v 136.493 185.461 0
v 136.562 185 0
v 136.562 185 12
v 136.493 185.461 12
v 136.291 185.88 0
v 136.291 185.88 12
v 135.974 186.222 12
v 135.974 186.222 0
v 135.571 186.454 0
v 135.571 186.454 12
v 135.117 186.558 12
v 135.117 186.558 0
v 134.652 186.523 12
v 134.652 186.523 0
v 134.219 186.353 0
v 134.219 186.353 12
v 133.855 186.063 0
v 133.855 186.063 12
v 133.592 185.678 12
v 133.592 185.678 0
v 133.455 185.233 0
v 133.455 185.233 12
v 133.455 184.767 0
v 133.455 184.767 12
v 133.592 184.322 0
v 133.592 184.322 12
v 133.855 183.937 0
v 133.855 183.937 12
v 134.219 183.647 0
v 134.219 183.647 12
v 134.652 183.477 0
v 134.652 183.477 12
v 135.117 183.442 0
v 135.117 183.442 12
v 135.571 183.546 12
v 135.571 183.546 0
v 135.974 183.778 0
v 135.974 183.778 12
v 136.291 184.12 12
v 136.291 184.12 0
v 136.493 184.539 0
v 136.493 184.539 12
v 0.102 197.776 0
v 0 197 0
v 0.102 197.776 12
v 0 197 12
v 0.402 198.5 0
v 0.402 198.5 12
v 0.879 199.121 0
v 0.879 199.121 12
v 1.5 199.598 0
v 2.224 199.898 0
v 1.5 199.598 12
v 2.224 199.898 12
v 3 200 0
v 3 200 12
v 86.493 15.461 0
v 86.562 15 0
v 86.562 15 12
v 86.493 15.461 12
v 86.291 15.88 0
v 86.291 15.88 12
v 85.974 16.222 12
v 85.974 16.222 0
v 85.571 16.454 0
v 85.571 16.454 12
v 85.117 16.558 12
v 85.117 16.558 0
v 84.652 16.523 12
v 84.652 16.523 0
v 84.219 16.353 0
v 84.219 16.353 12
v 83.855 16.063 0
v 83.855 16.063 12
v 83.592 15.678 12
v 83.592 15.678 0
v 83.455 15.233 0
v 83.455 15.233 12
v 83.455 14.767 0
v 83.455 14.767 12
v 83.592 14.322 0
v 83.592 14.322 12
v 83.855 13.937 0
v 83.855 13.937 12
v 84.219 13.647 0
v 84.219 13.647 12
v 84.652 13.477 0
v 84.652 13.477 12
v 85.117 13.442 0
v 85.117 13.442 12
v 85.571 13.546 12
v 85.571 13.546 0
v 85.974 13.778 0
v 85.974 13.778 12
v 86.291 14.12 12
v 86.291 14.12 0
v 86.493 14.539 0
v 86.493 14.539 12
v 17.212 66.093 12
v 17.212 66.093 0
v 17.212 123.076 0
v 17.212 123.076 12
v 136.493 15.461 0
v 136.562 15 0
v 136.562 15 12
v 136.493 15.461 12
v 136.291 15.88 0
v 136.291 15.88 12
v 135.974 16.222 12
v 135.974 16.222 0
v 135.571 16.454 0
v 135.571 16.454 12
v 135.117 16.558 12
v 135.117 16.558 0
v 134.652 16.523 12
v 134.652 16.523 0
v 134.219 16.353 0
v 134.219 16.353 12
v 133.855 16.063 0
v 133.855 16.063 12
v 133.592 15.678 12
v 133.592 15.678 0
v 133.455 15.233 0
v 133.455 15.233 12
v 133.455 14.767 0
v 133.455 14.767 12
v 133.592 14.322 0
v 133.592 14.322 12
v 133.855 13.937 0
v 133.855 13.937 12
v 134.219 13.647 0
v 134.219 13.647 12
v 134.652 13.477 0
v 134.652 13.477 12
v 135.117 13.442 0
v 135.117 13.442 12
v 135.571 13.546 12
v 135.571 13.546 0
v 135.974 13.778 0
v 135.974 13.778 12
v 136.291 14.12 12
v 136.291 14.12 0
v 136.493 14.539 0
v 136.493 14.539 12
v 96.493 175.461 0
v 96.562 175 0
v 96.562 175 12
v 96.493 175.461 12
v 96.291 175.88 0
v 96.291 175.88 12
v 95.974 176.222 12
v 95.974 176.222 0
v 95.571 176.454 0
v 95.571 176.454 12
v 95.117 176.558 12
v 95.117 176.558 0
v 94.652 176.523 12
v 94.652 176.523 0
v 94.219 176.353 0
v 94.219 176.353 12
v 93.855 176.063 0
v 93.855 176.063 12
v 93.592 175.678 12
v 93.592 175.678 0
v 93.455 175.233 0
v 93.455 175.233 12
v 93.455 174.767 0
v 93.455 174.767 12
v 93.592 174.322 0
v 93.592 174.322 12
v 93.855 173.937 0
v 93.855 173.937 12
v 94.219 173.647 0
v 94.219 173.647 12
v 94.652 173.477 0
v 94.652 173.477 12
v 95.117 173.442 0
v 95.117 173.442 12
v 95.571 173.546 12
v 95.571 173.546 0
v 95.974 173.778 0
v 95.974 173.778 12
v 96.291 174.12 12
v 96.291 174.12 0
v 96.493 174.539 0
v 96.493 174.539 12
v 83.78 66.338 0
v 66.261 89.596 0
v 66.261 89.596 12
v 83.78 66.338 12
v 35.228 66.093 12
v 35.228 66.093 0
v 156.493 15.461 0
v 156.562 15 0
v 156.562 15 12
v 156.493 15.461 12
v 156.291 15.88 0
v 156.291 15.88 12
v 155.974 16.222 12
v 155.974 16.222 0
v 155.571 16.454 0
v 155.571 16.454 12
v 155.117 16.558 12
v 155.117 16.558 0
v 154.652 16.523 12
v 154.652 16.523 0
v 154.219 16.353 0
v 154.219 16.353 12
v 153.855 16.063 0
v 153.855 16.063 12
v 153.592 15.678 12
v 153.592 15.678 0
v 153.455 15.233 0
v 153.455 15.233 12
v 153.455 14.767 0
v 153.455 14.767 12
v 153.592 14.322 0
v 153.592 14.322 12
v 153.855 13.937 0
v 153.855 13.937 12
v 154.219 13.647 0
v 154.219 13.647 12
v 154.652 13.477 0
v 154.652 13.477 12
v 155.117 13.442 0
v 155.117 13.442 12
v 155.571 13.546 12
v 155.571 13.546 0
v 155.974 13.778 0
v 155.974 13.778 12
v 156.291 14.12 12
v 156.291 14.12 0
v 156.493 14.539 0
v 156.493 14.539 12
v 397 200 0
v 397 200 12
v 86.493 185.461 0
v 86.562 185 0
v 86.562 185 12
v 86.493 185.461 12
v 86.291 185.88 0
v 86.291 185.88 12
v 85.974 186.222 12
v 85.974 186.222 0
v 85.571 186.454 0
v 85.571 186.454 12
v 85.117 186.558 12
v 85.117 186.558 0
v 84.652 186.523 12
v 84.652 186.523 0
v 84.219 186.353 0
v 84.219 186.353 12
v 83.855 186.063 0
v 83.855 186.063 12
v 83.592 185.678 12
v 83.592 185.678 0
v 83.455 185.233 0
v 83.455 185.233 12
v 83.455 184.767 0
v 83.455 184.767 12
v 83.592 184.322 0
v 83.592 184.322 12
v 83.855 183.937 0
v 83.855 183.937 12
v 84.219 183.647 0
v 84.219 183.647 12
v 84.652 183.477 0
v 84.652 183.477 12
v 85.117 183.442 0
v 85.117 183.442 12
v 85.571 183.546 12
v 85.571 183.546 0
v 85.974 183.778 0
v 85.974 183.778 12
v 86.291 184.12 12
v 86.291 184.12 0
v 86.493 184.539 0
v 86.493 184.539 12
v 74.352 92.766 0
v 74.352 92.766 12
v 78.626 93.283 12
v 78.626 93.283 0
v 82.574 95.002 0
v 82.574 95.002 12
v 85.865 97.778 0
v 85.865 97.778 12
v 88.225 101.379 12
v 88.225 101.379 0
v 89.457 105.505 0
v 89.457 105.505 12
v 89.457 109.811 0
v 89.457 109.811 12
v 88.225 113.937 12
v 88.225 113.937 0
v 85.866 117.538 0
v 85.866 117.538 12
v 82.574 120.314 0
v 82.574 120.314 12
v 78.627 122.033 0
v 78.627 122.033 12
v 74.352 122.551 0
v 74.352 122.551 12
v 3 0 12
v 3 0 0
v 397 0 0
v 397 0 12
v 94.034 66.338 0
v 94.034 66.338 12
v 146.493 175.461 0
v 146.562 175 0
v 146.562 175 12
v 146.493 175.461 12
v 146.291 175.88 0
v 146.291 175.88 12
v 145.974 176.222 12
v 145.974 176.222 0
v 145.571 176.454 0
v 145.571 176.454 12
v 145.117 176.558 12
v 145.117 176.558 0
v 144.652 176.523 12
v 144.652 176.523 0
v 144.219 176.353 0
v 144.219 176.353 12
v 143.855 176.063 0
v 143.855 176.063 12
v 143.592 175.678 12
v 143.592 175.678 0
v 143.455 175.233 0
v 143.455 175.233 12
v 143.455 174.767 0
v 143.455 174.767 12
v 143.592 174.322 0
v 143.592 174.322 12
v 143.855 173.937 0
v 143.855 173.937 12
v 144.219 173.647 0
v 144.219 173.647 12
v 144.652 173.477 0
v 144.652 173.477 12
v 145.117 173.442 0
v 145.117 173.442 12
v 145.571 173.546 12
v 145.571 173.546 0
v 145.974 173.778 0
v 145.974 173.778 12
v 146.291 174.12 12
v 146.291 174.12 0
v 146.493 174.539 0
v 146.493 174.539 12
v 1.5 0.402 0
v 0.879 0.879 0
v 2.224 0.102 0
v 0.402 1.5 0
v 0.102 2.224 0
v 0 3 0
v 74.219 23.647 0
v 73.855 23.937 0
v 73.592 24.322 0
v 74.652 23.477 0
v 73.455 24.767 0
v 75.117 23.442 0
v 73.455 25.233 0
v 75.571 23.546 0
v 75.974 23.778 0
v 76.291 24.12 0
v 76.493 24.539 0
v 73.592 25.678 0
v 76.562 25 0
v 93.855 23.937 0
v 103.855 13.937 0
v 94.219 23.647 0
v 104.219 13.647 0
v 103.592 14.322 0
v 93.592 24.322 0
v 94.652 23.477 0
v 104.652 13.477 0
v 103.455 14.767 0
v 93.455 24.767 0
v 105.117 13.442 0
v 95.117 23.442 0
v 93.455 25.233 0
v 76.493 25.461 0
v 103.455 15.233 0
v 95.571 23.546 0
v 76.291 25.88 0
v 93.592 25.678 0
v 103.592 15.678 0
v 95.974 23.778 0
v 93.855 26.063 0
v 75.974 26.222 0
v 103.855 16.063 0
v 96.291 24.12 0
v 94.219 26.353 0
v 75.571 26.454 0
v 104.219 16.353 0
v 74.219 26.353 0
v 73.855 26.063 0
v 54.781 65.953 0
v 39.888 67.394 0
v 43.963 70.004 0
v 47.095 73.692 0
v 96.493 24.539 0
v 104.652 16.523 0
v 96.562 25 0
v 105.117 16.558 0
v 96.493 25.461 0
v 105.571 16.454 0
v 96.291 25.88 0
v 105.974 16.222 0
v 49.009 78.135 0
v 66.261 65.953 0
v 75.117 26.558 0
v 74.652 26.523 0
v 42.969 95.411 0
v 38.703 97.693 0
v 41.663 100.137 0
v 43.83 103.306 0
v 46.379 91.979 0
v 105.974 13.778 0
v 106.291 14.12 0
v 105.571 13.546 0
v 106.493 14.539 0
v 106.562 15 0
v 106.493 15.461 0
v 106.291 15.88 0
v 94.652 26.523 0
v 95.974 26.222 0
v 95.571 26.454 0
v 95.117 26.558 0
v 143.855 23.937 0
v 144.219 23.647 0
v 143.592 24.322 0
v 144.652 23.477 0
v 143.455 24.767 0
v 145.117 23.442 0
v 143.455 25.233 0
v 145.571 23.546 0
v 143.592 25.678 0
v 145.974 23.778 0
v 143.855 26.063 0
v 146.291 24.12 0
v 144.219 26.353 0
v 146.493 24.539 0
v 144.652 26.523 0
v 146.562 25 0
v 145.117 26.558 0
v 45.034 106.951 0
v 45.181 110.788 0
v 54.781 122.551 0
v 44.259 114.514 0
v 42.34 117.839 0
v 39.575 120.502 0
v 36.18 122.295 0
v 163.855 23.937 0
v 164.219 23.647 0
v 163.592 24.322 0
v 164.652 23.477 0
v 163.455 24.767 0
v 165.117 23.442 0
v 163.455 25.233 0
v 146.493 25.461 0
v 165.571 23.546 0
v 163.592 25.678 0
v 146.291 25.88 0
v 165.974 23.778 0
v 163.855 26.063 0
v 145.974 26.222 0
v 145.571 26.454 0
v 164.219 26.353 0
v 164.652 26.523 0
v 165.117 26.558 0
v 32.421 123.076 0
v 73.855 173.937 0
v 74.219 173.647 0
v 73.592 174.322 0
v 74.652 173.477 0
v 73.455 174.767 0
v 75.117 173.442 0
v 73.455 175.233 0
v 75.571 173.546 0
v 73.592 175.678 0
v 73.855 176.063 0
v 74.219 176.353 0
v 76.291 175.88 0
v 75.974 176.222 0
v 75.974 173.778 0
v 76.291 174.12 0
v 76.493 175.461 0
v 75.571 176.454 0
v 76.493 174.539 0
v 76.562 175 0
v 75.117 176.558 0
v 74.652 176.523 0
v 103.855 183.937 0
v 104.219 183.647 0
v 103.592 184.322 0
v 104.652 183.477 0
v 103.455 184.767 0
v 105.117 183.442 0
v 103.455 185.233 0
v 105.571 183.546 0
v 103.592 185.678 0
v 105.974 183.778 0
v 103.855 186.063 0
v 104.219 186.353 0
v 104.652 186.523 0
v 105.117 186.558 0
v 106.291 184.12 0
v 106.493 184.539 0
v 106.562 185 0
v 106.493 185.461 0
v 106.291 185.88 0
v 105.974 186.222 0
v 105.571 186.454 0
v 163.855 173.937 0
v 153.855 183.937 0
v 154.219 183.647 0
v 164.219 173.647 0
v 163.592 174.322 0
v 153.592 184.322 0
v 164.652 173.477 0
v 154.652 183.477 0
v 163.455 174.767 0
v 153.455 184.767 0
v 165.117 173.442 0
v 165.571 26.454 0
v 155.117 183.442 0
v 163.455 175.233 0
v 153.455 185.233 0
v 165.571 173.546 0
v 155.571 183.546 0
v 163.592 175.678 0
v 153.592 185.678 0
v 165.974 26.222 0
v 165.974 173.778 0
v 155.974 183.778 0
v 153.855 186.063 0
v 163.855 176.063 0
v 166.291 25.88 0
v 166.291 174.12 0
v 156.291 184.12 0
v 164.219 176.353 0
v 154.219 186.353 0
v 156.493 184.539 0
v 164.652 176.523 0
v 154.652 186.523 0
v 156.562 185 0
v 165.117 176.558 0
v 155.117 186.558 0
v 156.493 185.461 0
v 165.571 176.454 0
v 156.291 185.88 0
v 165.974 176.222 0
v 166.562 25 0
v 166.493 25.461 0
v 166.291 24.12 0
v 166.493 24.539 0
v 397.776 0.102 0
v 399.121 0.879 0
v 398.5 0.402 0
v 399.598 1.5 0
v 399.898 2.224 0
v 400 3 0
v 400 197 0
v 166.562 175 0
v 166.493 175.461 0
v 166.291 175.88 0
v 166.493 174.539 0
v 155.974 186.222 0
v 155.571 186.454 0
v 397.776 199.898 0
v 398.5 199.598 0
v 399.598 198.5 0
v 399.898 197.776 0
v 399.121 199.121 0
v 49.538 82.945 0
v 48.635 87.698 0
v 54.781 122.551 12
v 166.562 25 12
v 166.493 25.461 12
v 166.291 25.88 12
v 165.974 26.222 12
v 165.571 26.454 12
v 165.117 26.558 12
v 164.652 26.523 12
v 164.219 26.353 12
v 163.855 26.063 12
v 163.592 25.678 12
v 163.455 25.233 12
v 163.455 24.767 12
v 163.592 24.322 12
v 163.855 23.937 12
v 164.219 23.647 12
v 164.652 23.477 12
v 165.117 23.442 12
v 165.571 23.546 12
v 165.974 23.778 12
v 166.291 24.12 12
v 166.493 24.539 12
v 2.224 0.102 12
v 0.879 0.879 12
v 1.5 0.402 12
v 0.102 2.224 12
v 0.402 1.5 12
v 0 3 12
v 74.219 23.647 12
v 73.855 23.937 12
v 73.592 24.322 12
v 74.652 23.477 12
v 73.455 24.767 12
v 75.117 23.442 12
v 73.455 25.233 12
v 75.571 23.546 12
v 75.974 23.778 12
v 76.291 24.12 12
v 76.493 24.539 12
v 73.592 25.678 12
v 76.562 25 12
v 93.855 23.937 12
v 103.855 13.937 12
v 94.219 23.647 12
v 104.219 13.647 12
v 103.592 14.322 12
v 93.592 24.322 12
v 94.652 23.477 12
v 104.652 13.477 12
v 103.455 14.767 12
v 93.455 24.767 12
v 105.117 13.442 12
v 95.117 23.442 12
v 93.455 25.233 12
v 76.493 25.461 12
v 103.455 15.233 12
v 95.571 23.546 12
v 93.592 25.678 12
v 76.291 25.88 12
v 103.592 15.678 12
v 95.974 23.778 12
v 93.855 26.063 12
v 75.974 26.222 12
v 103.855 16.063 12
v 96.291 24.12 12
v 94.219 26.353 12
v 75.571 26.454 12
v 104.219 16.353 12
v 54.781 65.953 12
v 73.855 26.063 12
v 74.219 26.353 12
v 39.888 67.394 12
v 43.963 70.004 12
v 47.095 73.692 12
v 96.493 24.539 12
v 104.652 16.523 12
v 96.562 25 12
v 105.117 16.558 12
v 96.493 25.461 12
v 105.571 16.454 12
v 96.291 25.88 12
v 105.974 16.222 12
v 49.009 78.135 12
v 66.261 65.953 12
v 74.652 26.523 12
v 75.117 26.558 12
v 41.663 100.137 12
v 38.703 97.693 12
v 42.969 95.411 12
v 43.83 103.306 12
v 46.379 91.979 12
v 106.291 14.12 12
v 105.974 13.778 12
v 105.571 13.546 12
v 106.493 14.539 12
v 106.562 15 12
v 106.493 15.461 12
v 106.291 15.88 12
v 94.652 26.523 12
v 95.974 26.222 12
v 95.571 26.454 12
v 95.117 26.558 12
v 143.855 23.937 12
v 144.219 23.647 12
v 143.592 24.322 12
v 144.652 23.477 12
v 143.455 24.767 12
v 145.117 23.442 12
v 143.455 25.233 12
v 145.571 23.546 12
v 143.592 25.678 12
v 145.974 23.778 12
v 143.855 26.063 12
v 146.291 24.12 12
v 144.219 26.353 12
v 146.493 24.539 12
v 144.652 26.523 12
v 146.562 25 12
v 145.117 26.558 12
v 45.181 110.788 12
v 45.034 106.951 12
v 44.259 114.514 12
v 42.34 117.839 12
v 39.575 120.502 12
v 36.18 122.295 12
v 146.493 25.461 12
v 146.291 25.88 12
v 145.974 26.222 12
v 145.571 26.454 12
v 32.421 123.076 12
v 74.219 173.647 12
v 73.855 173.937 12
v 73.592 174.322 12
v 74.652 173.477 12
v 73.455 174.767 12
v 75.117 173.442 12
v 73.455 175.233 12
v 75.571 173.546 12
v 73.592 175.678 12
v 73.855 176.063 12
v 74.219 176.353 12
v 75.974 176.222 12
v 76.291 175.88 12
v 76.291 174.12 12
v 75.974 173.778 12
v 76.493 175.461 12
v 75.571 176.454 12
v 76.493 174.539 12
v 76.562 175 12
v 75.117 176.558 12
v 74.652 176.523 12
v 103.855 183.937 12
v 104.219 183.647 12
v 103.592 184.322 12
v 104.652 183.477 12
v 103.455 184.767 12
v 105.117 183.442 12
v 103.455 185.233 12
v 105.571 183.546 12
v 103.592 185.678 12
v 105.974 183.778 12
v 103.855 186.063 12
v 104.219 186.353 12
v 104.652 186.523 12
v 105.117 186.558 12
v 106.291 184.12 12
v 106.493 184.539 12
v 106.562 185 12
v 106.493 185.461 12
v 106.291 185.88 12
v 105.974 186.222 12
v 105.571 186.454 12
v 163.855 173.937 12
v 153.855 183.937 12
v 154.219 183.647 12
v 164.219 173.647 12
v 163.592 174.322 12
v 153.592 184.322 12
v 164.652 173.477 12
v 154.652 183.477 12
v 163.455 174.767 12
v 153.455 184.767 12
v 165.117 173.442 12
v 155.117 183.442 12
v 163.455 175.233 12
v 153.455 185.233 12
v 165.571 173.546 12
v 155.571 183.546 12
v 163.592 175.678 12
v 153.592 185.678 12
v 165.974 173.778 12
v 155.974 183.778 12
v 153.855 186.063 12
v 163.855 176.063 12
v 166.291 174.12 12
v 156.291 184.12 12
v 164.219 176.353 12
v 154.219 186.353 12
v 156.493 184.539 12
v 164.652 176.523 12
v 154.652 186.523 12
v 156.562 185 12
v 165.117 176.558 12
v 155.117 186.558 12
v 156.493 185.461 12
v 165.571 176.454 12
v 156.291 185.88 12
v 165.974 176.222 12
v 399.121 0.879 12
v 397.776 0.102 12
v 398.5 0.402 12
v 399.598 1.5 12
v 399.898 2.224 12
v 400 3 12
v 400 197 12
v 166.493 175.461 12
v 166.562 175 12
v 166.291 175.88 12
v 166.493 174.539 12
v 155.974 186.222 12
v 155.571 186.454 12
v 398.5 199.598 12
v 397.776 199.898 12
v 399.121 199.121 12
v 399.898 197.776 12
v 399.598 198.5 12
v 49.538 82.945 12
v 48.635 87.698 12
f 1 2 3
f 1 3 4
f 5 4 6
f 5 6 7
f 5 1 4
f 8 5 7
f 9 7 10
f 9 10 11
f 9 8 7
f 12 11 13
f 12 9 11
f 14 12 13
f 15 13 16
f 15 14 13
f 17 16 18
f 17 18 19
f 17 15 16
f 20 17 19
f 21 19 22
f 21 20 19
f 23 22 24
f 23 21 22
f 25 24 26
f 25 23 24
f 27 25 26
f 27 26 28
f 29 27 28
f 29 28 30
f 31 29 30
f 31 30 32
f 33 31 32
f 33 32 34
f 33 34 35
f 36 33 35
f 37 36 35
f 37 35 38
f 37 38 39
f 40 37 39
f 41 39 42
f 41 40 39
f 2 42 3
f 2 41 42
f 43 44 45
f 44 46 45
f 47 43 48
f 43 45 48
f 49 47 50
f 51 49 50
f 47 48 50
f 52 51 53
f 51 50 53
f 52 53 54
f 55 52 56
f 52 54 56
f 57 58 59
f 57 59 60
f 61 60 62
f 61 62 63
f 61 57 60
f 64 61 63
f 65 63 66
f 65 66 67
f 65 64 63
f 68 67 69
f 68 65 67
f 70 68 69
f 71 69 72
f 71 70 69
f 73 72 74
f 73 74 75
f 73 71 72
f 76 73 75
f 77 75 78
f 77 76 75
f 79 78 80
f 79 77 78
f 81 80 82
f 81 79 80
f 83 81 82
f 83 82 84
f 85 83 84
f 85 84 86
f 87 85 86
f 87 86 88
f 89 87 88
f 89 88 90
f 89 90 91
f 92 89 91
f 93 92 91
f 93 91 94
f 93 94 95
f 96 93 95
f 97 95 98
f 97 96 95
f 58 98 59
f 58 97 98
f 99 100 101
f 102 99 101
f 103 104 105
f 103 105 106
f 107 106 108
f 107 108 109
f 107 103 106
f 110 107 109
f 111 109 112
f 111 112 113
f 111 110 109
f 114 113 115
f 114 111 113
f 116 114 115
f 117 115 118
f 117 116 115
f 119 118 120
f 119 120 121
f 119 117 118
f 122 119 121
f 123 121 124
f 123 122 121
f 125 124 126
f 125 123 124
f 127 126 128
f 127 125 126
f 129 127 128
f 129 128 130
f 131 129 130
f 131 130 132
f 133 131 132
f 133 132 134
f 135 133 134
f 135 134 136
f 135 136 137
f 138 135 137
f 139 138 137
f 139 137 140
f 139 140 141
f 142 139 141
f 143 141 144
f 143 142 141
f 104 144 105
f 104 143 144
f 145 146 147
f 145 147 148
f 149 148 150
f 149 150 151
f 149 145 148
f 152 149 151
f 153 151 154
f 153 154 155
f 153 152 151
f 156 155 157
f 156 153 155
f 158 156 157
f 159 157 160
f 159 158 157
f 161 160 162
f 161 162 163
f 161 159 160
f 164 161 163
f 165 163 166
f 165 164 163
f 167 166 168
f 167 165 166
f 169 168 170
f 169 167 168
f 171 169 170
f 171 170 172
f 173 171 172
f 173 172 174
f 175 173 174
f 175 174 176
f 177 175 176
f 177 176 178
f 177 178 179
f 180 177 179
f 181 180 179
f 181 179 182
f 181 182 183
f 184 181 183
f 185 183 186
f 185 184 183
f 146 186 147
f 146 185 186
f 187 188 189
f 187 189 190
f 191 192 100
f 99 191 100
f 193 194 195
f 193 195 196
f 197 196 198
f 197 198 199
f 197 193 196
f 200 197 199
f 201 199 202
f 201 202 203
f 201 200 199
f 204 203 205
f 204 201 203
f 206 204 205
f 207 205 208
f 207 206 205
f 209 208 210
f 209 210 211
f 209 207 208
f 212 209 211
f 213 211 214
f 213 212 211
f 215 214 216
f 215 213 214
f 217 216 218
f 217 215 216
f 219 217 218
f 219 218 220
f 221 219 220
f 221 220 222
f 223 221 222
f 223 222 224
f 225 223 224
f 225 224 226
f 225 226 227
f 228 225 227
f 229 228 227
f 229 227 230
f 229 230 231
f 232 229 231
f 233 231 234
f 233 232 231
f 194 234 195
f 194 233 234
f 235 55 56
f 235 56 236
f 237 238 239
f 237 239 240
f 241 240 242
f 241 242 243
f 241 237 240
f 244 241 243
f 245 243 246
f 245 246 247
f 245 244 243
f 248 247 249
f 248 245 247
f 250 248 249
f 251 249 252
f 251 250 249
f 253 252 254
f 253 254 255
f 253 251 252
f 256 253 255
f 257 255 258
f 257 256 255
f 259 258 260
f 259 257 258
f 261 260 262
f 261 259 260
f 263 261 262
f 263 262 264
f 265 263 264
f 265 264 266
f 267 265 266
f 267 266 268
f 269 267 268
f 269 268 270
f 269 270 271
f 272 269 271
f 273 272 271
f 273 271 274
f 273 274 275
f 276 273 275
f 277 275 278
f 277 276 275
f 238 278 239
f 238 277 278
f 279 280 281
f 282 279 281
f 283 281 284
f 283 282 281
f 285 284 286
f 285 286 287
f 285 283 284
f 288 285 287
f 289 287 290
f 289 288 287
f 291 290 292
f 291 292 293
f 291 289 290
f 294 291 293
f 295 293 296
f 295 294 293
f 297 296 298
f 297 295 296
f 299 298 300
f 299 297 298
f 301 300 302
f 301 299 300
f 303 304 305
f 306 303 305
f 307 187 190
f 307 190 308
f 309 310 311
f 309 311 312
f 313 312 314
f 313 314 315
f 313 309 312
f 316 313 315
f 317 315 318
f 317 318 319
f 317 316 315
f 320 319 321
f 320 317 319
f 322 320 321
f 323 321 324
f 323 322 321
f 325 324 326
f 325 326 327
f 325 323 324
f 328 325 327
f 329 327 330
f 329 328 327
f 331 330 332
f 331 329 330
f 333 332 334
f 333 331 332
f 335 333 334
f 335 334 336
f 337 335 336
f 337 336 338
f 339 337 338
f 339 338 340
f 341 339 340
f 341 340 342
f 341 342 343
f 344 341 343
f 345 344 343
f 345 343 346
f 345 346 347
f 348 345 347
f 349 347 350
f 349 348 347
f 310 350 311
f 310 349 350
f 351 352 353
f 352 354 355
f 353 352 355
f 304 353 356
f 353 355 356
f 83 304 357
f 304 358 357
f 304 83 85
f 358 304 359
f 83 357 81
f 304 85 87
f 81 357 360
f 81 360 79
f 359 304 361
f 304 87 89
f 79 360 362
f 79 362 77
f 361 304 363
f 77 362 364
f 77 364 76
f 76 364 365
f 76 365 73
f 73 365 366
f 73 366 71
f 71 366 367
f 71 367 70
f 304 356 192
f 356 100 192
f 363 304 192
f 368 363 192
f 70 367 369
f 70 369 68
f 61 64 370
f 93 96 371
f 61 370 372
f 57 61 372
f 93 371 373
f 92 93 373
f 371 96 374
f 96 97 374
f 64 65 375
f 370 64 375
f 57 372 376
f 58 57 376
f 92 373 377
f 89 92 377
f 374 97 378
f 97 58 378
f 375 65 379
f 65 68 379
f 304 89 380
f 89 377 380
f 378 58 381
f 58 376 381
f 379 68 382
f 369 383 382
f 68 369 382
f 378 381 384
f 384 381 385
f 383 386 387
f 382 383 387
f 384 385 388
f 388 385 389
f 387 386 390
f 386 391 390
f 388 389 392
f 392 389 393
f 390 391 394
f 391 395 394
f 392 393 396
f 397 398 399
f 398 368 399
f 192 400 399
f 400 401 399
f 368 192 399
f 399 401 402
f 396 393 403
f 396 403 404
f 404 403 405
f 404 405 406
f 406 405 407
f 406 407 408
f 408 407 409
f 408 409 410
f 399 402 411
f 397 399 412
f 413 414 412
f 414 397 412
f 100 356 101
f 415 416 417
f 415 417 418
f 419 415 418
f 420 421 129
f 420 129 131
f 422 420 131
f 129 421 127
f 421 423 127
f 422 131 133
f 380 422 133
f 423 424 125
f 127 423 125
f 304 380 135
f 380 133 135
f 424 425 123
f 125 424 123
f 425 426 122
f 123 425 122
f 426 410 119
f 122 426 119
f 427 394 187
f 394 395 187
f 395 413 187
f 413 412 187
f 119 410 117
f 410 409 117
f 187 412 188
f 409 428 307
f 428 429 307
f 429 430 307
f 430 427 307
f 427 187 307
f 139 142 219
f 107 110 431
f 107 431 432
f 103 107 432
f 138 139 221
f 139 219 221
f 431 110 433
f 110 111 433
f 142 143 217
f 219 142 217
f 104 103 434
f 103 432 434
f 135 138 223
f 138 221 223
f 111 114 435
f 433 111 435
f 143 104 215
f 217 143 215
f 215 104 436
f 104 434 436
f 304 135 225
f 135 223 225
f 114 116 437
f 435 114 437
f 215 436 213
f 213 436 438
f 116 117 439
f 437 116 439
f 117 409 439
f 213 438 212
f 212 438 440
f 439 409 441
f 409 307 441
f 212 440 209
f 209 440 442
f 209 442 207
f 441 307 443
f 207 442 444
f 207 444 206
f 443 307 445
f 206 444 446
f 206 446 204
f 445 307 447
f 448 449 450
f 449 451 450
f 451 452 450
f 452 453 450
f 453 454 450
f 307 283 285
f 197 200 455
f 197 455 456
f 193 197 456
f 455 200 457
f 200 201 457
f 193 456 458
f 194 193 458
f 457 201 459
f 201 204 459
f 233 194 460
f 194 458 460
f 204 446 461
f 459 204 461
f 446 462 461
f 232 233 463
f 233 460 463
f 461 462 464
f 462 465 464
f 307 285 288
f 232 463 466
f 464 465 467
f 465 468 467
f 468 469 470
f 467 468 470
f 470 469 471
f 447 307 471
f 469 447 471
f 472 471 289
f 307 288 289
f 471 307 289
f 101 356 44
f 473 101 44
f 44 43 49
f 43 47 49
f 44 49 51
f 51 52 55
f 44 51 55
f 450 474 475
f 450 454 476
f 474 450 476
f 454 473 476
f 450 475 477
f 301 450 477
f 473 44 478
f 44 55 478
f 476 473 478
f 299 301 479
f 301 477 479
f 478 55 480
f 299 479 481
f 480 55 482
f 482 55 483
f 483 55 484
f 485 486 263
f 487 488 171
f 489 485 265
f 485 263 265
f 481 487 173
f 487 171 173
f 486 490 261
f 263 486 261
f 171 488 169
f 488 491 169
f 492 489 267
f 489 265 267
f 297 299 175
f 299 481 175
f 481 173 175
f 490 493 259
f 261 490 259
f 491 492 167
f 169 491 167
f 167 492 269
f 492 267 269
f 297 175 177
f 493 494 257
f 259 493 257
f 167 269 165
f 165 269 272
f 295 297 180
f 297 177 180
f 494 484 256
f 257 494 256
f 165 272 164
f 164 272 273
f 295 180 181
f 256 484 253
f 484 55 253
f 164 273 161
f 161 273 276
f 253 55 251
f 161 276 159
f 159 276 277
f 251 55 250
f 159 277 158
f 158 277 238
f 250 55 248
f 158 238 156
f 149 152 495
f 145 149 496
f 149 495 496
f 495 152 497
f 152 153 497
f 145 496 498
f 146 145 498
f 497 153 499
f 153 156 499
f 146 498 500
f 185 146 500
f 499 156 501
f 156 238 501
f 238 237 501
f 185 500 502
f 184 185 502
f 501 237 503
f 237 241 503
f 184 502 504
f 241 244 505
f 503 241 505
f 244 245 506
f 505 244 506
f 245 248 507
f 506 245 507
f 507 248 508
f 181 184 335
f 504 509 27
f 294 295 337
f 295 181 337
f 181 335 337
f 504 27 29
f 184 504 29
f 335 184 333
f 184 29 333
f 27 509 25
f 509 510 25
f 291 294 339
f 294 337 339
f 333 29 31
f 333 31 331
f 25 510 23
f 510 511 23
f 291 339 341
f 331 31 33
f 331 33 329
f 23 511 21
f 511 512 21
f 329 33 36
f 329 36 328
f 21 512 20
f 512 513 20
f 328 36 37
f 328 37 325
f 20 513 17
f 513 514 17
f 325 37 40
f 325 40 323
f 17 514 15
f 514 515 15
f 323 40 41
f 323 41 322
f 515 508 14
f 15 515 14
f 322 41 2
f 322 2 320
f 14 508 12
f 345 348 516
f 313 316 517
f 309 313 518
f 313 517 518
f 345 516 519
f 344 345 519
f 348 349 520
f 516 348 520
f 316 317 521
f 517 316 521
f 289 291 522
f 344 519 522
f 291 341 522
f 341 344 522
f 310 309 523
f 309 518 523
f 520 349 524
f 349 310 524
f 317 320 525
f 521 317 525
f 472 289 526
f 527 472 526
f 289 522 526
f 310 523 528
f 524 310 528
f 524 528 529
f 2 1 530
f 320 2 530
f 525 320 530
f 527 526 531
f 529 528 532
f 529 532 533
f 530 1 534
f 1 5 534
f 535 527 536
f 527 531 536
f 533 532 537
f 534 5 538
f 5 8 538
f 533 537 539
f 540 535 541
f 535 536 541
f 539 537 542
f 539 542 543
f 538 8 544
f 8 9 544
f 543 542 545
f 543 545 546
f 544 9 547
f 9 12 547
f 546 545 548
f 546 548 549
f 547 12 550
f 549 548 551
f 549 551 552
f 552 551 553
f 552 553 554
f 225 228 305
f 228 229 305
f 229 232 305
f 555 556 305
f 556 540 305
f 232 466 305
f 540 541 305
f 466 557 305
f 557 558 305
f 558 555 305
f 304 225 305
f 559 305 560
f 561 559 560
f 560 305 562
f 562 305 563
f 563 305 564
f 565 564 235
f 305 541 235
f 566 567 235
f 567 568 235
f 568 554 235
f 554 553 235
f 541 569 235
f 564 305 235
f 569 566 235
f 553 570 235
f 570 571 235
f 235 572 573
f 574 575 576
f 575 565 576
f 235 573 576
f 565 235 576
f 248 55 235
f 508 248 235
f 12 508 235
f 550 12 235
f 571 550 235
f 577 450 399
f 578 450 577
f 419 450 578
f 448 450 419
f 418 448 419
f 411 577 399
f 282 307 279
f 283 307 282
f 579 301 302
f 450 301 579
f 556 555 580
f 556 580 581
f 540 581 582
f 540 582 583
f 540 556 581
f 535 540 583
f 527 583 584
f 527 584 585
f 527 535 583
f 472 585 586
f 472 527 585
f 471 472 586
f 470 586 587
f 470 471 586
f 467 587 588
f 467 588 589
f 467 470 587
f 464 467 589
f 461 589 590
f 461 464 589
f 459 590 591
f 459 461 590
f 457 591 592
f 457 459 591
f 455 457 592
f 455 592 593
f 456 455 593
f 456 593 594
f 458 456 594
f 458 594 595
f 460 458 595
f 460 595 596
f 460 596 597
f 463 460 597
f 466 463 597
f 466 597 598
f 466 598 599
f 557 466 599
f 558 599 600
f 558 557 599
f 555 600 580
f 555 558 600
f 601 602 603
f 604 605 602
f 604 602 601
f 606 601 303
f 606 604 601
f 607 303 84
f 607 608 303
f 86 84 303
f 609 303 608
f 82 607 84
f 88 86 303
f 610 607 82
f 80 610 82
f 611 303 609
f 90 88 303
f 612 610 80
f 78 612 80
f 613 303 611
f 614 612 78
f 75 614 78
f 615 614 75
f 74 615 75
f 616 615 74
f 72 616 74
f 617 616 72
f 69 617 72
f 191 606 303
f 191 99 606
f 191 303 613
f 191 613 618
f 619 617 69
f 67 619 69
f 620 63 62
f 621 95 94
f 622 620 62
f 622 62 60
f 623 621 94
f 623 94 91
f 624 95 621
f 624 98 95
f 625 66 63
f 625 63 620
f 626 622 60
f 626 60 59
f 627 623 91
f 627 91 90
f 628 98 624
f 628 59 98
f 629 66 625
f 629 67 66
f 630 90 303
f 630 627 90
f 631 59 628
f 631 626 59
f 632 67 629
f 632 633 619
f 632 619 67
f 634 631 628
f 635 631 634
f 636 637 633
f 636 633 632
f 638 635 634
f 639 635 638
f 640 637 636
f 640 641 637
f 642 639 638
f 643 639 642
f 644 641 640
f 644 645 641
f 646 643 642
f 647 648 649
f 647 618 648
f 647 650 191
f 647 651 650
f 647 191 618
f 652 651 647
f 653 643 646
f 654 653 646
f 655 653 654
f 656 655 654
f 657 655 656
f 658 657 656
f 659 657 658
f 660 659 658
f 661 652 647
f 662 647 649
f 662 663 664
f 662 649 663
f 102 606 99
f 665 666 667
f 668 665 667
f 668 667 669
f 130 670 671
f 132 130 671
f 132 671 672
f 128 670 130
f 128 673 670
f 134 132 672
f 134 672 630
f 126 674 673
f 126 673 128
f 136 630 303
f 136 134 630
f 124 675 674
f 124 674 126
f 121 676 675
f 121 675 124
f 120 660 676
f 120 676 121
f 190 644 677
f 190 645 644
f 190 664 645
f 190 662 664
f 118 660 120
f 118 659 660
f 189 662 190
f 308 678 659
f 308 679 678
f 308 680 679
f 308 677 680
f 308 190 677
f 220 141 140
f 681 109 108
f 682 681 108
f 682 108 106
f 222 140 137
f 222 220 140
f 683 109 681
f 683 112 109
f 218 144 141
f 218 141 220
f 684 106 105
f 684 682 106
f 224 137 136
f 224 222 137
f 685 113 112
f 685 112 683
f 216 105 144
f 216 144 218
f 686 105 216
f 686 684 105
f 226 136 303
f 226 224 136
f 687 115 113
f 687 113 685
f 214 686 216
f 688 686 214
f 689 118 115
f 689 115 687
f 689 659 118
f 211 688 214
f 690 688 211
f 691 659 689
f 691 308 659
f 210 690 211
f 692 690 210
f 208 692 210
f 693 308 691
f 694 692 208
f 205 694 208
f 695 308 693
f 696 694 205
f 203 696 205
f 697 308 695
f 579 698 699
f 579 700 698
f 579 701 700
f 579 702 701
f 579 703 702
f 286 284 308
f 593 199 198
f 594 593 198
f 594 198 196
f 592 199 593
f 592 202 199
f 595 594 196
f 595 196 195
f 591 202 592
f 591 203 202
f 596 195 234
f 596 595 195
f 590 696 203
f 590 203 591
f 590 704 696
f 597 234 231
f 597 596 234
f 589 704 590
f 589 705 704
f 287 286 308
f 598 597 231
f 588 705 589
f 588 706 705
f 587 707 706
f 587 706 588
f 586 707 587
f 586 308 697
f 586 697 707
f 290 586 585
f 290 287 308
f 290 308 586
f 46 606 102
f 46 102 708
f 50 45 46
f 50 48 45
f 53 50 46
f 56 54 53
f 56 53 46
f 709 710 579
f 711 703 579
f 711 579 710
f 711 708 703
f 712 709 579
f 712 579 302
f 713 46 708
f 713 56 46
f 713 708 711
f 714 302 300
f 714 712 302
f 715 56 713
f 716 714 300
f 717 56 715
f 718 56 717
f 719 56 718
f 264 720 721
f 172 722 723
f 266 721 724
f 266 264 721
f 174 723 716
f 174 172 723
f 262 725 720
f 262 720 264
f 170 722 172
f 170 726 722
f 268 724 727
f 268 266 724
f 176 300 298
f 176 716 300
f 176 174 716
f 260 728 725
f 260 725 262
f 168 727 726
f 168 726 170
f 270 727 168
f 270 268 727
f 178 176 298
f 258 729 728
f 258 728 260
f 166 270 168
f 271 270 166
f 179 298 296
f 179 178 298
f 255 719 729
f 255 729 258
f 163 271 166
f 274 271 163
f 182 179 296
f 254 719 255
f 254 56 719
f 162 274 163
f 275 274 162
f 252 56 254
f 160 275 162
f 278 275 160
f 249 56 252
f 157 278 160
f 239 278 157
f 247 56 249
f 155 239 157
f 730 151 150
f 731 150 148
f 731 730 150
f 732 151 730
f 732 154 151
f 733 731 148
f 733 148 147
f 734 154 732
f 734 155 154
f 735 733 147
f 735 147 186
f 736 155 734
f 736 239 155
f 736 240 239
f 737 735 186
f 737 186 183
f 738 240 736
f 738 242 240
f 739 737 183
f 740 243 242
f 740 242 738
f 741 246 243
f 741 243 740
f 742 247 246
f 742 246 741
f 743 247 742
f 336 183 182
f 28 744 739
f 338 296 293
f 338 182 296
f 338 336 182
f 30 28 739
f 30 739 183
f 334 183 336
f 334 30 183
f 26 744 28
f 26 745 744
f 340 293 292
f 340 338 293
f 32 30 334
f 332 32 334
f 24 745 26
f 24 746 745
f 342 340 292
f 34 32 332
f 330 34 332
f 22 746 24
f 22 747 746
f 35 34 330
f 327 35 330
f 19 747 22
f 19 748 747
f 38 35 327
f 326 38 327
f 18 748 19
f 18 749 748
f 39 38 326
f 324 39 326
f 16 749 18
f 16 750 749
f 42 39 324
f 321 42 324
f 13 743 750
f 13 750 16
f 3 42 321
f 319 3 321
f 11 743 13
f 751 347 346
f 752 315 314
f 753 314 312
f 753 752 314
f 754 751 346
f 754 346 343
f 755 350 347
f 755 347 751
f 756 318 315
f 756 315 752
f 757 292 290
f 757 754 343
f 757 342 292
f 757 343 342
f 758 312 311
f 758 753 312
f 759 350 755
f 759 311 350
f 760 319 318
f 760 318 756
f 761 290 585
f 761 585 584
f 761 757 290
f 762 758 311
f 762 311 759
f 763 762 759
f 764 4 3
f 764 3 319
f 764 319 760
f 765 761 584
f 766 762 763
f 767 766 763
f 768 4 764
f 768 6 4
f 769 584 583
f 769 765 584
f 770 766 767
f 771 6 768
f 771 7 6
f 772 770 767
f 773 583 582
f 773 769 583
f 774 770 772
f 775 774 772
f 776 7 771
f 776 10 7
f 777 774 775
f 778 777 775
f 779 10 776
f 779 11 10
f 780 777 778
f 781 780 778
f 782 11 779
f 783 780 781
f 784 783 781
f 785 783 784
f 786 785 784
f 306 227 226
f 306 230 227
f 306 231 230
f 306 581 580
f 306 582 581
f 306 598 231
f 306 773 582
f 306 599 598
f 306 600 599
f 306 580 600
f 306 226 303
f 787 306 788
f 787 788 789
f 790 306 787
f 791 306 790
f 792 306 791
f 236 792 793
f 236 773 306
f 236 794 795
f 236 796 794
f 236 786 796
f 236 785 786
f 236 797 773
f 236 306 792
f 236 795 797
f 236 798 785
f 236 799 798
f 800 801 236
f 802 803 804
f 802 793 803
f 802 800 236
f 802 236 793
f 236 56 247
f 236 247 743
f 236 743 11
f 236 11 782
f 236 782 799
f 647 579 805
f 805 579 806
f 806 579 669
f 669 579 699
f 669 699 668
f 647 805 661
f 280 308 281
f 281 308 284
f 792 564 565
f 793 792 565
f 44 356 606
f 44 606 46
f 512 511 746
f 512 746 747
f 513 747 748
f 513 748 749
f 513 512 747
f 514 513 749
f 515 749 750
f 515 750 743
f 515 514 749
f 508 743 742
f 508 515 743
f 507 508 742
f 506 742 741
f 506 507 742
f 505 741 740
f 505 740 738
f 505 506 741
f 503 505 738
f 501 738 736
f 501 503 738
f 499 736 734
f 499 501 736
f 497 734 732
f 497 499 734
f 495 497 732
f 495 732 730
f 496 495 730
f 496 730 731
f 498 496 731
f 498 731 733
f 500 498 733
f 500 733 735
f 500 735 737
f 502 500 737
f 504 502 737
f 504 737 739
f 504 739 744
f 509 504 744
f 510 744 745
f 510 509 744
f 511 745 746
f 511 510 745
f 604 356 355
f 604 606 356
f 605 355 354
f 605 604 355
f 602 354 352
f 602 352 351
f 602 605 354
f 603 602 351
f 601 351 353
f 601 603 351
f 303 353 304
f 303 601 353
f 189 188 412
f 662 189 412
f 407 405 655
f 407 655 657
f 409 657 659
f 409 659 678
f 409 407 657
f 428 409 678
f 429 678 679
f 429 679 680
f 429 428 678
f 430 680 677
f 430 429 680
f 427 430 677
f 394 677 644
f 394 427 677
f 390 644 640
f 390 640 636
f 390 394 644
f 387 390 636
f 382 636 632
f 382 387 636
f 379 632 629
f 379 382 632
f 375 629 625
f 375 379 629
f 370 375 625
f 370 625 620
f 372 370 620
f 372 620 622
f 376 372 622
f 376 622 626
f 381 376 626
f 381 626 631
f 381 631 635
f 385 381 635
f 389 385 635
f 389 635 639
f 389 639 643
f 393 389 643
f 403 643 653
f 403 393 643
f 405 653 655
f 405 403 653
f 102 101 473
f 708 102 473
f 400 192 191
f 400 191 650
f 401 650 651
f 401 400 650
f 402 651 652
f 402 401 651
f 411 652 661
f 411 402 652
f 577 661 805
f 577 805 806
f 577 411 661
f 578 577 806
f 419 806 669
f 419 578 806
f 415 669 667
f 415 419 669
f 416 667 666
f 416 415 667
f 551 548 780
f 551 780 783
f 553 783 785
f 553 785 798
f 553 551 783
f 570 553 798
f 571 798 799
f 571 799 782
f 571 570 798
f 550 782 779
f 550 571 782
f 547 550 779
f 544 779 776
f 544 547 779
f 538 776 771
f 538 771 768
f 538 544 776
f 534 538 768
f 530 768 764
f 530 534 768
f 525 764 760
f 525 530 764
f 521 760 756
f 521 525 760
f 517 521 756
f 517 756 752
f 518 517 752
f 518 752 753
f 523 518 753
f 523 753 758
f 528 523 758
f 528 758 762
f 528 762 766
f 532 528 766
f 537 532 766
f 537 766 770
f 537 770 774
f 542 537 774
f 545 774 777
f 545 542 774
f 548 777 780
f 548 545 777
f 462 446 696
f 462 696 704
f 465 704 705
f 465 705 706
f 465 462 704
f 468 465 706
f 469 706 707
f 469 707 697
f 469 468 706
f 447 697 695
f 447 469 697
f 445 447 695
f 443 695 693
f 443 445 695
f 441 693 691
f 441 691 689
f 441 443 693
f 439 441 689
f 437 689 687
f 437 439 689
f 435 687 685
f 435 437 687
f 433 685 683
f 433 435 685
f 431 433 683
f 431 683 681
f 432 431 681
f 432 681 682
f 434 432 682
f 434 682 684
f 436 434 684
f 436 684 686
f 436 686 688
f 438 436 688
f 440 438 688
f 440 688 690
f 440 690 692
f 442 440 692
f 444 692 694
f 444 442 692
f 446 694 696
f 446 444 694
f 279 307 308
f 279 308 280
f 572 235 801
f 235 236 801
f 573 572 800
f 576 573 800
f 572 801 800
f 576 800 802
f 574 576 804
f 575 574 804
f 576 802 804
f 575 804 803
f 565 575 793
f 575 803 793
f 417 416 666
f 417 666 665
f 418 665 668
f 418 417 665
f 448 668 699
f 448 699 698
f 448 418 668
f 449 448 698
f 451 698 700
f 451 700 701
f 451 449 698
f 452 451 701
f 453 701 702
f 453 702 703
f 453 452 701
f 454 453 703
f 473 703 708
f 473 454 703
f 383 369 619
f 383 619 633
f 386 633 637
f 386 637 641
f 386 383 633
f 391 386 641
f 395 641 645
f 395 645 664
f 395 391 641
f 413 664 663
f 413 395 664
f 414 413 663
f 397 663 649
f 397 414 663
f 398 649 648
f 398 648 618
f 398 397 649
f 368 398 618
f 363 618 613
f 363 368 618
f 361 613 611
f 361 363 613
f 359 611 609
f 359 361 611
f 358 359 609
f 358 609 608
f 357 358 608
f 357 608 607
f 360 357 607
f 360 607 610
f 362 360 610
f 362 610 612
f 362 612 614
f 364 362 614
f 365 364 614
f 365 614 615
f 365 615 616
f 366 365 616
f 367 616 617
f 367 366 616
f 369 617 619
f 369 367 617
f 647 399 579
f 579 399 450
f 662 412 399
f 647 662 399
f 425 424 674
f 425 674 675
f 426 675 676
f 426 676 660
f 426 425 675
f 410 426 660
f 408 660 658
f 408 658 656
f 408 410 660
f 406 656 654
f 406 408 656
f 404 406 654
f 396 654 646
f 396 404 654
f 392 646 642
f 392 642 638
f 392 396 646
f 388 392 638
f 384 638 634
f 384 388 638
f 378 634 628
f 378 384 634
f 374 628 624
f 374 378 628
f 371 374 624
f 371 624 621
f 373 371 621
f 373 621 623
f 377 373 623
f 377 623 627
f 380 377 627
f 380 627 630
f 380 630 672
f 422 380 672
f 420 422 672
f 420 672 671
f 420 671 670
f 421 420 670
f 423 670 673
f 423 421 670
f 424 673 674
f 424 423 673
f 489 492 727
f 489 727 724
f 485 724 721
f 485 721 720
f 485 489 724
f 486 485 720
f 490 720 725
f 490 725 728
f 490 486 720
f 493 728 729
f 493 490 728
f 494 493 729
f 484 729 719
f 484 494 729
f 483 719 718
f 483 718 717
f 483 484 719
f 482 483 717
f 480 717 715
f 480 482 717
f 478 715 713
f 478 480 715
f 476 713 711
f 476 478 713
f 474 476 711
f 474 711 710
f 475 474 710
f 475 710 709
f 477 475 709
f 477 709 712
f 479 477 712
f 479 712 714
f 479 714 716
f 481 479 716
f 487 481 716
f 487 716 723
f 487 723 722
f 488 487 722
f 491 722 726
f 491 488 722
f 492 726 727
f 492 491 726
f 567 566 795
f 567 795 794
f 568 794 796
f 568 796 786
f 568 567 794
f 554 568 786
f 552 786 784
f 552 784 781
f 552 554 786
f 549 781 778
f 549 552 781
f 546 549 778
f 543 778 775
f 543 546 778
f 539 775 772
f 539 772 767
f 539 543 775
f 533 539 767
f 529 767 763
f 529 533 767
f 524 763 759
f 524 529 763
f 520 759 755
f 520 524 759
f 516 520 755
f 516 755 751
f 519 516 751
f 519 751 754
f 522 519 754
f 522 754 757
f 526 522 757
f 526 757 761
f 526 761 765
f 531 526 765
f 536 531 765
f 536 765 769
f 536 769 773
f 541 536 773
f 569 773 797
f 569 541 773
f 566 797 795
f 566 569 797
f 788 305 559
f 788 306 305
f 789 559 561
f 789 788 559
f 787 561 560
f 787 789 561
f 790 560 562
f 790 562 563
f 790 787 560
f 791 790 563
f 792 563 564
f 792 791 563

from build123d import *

# Parameters (mm, degrees)
SKETCH_W  = 400
SKETCH_H  = 200
SKETCH_R  = 1.5625
PAD_DEPTH = 12
FILLET_R  = 3


with BuildPart() as part:
    # Sketch → Pad (new body)
    with BuildSketch(Plane.XY):
        with Locations((200, 100)):
            Rectangle(SKETCH_W, SKETCH_H)
        with Locations((85, 15)):
            Circle(SKETCH_R, mode=Mode.SUBTRACT)
        with Locations((105, 15)):
            Circle(SKETCH_R, mode=Mode.SUBTRACT)
        with Locations((75, 25)):
            Circle(SKETCH_R, mode=Mode.SUBTRACT)
        with Locations((95, 25)):
            Circle(SKETCH_R, mode=Mode.SUBTRACT)
        with Locations((155, 15)):
            Circle(SKETCH_R, mode=Mode.SUBTRACT)
        with Locations((135, 15)):
            Circle(SKETCH_R, mode=Mode.SUBTRACT)
        with Locations((145, 25)):
            Circle(SKETCH_R, mode=Mode.SUBTRACT)
        with Locations((165, 25)):
            Circle(SKETCH_R, mode=Mode.SUBTRACT)
        with Locations((85, 185)):
            Circle(SKETCH_R, mode=Mode.SUBTRACT)
        with Locations((105, 185)):
            Circle(SKETCH_R, mode=Mode.SUBTRACT)
        with Locations((75, 175)):
            Circle(SKETCH_R, mode=Mode.SUBTRACT)
        with Locations((95, 175)):
            Circle(SKETCH_R, mode=Mode.SUBTRACT)
        with Locations((155, 185)):
            Circle(SKETCH_R, mode=Mode.SUBTRACT)
        with Locations((135, 185)):
            Circle(SKETCH_R, mode=Mode.SUBTRACT)
        with Locations((145, 175)):
            Circle(SKETCH_R, mode=Mode.SUBTRACT)
        with Locations((165, 175)):
            Circle(SKETCH_R, mode=Mode.SUBTRACT)
        with BuildLine():
            Line((17.211533, 123.076019), (32.421267, 123.076019))
            ThreePointArc((38.702517, 97.693395), (44.851125, 112.683445), (32.421267, 123.076019))
            ThreePointArc((35.228252, 66.093052), (49.45239, 80.520354), (38.702517, 97.693395))
            Line((35.228252, 66.093052), (17.211533, 66.093052))
            Line((17.211533, 66.093052), (17.211533, 123.076019))
        make_face(mode=Mode.SUBTRACT)
        with BuildLine():
            Line((66.260755, 65.953049), (54.781403, 65.953049))
            Line((54.781403, 65.953049), (54.781403, 122.551093))
            Line((74.352173, 122.551093), (54.781403, 122.551093))
            ThreePointArc((74.351683, 92.765599), (89.613073, 107.658094), (74.352173, 122.551093))
            Line((94.033974, 66.33828), (74.351683, 92.765599))
            Line((83.779968, 66.33828), (94.033974, 66.33828))
            Line((66.260755, 89.596498), (83.779968, 66.33828))
            Line((66.260755, 89.596498), (66.260755, 65.953049))
        make_face(mode=Mode.SUBTRACT)
    extrude(amount=PAD_DEPTH)

    # Fillet
    fillet_edges = [part.edges().sort_by_distance(p)[0] for p in [
        (0, 0, 6),
        (400, 0, 6),
        (400, 200, 6),
        (0, 200, 6),
    ]]
    fillet(fillet_edges, radius=FILLET_R)


solid = part.part
